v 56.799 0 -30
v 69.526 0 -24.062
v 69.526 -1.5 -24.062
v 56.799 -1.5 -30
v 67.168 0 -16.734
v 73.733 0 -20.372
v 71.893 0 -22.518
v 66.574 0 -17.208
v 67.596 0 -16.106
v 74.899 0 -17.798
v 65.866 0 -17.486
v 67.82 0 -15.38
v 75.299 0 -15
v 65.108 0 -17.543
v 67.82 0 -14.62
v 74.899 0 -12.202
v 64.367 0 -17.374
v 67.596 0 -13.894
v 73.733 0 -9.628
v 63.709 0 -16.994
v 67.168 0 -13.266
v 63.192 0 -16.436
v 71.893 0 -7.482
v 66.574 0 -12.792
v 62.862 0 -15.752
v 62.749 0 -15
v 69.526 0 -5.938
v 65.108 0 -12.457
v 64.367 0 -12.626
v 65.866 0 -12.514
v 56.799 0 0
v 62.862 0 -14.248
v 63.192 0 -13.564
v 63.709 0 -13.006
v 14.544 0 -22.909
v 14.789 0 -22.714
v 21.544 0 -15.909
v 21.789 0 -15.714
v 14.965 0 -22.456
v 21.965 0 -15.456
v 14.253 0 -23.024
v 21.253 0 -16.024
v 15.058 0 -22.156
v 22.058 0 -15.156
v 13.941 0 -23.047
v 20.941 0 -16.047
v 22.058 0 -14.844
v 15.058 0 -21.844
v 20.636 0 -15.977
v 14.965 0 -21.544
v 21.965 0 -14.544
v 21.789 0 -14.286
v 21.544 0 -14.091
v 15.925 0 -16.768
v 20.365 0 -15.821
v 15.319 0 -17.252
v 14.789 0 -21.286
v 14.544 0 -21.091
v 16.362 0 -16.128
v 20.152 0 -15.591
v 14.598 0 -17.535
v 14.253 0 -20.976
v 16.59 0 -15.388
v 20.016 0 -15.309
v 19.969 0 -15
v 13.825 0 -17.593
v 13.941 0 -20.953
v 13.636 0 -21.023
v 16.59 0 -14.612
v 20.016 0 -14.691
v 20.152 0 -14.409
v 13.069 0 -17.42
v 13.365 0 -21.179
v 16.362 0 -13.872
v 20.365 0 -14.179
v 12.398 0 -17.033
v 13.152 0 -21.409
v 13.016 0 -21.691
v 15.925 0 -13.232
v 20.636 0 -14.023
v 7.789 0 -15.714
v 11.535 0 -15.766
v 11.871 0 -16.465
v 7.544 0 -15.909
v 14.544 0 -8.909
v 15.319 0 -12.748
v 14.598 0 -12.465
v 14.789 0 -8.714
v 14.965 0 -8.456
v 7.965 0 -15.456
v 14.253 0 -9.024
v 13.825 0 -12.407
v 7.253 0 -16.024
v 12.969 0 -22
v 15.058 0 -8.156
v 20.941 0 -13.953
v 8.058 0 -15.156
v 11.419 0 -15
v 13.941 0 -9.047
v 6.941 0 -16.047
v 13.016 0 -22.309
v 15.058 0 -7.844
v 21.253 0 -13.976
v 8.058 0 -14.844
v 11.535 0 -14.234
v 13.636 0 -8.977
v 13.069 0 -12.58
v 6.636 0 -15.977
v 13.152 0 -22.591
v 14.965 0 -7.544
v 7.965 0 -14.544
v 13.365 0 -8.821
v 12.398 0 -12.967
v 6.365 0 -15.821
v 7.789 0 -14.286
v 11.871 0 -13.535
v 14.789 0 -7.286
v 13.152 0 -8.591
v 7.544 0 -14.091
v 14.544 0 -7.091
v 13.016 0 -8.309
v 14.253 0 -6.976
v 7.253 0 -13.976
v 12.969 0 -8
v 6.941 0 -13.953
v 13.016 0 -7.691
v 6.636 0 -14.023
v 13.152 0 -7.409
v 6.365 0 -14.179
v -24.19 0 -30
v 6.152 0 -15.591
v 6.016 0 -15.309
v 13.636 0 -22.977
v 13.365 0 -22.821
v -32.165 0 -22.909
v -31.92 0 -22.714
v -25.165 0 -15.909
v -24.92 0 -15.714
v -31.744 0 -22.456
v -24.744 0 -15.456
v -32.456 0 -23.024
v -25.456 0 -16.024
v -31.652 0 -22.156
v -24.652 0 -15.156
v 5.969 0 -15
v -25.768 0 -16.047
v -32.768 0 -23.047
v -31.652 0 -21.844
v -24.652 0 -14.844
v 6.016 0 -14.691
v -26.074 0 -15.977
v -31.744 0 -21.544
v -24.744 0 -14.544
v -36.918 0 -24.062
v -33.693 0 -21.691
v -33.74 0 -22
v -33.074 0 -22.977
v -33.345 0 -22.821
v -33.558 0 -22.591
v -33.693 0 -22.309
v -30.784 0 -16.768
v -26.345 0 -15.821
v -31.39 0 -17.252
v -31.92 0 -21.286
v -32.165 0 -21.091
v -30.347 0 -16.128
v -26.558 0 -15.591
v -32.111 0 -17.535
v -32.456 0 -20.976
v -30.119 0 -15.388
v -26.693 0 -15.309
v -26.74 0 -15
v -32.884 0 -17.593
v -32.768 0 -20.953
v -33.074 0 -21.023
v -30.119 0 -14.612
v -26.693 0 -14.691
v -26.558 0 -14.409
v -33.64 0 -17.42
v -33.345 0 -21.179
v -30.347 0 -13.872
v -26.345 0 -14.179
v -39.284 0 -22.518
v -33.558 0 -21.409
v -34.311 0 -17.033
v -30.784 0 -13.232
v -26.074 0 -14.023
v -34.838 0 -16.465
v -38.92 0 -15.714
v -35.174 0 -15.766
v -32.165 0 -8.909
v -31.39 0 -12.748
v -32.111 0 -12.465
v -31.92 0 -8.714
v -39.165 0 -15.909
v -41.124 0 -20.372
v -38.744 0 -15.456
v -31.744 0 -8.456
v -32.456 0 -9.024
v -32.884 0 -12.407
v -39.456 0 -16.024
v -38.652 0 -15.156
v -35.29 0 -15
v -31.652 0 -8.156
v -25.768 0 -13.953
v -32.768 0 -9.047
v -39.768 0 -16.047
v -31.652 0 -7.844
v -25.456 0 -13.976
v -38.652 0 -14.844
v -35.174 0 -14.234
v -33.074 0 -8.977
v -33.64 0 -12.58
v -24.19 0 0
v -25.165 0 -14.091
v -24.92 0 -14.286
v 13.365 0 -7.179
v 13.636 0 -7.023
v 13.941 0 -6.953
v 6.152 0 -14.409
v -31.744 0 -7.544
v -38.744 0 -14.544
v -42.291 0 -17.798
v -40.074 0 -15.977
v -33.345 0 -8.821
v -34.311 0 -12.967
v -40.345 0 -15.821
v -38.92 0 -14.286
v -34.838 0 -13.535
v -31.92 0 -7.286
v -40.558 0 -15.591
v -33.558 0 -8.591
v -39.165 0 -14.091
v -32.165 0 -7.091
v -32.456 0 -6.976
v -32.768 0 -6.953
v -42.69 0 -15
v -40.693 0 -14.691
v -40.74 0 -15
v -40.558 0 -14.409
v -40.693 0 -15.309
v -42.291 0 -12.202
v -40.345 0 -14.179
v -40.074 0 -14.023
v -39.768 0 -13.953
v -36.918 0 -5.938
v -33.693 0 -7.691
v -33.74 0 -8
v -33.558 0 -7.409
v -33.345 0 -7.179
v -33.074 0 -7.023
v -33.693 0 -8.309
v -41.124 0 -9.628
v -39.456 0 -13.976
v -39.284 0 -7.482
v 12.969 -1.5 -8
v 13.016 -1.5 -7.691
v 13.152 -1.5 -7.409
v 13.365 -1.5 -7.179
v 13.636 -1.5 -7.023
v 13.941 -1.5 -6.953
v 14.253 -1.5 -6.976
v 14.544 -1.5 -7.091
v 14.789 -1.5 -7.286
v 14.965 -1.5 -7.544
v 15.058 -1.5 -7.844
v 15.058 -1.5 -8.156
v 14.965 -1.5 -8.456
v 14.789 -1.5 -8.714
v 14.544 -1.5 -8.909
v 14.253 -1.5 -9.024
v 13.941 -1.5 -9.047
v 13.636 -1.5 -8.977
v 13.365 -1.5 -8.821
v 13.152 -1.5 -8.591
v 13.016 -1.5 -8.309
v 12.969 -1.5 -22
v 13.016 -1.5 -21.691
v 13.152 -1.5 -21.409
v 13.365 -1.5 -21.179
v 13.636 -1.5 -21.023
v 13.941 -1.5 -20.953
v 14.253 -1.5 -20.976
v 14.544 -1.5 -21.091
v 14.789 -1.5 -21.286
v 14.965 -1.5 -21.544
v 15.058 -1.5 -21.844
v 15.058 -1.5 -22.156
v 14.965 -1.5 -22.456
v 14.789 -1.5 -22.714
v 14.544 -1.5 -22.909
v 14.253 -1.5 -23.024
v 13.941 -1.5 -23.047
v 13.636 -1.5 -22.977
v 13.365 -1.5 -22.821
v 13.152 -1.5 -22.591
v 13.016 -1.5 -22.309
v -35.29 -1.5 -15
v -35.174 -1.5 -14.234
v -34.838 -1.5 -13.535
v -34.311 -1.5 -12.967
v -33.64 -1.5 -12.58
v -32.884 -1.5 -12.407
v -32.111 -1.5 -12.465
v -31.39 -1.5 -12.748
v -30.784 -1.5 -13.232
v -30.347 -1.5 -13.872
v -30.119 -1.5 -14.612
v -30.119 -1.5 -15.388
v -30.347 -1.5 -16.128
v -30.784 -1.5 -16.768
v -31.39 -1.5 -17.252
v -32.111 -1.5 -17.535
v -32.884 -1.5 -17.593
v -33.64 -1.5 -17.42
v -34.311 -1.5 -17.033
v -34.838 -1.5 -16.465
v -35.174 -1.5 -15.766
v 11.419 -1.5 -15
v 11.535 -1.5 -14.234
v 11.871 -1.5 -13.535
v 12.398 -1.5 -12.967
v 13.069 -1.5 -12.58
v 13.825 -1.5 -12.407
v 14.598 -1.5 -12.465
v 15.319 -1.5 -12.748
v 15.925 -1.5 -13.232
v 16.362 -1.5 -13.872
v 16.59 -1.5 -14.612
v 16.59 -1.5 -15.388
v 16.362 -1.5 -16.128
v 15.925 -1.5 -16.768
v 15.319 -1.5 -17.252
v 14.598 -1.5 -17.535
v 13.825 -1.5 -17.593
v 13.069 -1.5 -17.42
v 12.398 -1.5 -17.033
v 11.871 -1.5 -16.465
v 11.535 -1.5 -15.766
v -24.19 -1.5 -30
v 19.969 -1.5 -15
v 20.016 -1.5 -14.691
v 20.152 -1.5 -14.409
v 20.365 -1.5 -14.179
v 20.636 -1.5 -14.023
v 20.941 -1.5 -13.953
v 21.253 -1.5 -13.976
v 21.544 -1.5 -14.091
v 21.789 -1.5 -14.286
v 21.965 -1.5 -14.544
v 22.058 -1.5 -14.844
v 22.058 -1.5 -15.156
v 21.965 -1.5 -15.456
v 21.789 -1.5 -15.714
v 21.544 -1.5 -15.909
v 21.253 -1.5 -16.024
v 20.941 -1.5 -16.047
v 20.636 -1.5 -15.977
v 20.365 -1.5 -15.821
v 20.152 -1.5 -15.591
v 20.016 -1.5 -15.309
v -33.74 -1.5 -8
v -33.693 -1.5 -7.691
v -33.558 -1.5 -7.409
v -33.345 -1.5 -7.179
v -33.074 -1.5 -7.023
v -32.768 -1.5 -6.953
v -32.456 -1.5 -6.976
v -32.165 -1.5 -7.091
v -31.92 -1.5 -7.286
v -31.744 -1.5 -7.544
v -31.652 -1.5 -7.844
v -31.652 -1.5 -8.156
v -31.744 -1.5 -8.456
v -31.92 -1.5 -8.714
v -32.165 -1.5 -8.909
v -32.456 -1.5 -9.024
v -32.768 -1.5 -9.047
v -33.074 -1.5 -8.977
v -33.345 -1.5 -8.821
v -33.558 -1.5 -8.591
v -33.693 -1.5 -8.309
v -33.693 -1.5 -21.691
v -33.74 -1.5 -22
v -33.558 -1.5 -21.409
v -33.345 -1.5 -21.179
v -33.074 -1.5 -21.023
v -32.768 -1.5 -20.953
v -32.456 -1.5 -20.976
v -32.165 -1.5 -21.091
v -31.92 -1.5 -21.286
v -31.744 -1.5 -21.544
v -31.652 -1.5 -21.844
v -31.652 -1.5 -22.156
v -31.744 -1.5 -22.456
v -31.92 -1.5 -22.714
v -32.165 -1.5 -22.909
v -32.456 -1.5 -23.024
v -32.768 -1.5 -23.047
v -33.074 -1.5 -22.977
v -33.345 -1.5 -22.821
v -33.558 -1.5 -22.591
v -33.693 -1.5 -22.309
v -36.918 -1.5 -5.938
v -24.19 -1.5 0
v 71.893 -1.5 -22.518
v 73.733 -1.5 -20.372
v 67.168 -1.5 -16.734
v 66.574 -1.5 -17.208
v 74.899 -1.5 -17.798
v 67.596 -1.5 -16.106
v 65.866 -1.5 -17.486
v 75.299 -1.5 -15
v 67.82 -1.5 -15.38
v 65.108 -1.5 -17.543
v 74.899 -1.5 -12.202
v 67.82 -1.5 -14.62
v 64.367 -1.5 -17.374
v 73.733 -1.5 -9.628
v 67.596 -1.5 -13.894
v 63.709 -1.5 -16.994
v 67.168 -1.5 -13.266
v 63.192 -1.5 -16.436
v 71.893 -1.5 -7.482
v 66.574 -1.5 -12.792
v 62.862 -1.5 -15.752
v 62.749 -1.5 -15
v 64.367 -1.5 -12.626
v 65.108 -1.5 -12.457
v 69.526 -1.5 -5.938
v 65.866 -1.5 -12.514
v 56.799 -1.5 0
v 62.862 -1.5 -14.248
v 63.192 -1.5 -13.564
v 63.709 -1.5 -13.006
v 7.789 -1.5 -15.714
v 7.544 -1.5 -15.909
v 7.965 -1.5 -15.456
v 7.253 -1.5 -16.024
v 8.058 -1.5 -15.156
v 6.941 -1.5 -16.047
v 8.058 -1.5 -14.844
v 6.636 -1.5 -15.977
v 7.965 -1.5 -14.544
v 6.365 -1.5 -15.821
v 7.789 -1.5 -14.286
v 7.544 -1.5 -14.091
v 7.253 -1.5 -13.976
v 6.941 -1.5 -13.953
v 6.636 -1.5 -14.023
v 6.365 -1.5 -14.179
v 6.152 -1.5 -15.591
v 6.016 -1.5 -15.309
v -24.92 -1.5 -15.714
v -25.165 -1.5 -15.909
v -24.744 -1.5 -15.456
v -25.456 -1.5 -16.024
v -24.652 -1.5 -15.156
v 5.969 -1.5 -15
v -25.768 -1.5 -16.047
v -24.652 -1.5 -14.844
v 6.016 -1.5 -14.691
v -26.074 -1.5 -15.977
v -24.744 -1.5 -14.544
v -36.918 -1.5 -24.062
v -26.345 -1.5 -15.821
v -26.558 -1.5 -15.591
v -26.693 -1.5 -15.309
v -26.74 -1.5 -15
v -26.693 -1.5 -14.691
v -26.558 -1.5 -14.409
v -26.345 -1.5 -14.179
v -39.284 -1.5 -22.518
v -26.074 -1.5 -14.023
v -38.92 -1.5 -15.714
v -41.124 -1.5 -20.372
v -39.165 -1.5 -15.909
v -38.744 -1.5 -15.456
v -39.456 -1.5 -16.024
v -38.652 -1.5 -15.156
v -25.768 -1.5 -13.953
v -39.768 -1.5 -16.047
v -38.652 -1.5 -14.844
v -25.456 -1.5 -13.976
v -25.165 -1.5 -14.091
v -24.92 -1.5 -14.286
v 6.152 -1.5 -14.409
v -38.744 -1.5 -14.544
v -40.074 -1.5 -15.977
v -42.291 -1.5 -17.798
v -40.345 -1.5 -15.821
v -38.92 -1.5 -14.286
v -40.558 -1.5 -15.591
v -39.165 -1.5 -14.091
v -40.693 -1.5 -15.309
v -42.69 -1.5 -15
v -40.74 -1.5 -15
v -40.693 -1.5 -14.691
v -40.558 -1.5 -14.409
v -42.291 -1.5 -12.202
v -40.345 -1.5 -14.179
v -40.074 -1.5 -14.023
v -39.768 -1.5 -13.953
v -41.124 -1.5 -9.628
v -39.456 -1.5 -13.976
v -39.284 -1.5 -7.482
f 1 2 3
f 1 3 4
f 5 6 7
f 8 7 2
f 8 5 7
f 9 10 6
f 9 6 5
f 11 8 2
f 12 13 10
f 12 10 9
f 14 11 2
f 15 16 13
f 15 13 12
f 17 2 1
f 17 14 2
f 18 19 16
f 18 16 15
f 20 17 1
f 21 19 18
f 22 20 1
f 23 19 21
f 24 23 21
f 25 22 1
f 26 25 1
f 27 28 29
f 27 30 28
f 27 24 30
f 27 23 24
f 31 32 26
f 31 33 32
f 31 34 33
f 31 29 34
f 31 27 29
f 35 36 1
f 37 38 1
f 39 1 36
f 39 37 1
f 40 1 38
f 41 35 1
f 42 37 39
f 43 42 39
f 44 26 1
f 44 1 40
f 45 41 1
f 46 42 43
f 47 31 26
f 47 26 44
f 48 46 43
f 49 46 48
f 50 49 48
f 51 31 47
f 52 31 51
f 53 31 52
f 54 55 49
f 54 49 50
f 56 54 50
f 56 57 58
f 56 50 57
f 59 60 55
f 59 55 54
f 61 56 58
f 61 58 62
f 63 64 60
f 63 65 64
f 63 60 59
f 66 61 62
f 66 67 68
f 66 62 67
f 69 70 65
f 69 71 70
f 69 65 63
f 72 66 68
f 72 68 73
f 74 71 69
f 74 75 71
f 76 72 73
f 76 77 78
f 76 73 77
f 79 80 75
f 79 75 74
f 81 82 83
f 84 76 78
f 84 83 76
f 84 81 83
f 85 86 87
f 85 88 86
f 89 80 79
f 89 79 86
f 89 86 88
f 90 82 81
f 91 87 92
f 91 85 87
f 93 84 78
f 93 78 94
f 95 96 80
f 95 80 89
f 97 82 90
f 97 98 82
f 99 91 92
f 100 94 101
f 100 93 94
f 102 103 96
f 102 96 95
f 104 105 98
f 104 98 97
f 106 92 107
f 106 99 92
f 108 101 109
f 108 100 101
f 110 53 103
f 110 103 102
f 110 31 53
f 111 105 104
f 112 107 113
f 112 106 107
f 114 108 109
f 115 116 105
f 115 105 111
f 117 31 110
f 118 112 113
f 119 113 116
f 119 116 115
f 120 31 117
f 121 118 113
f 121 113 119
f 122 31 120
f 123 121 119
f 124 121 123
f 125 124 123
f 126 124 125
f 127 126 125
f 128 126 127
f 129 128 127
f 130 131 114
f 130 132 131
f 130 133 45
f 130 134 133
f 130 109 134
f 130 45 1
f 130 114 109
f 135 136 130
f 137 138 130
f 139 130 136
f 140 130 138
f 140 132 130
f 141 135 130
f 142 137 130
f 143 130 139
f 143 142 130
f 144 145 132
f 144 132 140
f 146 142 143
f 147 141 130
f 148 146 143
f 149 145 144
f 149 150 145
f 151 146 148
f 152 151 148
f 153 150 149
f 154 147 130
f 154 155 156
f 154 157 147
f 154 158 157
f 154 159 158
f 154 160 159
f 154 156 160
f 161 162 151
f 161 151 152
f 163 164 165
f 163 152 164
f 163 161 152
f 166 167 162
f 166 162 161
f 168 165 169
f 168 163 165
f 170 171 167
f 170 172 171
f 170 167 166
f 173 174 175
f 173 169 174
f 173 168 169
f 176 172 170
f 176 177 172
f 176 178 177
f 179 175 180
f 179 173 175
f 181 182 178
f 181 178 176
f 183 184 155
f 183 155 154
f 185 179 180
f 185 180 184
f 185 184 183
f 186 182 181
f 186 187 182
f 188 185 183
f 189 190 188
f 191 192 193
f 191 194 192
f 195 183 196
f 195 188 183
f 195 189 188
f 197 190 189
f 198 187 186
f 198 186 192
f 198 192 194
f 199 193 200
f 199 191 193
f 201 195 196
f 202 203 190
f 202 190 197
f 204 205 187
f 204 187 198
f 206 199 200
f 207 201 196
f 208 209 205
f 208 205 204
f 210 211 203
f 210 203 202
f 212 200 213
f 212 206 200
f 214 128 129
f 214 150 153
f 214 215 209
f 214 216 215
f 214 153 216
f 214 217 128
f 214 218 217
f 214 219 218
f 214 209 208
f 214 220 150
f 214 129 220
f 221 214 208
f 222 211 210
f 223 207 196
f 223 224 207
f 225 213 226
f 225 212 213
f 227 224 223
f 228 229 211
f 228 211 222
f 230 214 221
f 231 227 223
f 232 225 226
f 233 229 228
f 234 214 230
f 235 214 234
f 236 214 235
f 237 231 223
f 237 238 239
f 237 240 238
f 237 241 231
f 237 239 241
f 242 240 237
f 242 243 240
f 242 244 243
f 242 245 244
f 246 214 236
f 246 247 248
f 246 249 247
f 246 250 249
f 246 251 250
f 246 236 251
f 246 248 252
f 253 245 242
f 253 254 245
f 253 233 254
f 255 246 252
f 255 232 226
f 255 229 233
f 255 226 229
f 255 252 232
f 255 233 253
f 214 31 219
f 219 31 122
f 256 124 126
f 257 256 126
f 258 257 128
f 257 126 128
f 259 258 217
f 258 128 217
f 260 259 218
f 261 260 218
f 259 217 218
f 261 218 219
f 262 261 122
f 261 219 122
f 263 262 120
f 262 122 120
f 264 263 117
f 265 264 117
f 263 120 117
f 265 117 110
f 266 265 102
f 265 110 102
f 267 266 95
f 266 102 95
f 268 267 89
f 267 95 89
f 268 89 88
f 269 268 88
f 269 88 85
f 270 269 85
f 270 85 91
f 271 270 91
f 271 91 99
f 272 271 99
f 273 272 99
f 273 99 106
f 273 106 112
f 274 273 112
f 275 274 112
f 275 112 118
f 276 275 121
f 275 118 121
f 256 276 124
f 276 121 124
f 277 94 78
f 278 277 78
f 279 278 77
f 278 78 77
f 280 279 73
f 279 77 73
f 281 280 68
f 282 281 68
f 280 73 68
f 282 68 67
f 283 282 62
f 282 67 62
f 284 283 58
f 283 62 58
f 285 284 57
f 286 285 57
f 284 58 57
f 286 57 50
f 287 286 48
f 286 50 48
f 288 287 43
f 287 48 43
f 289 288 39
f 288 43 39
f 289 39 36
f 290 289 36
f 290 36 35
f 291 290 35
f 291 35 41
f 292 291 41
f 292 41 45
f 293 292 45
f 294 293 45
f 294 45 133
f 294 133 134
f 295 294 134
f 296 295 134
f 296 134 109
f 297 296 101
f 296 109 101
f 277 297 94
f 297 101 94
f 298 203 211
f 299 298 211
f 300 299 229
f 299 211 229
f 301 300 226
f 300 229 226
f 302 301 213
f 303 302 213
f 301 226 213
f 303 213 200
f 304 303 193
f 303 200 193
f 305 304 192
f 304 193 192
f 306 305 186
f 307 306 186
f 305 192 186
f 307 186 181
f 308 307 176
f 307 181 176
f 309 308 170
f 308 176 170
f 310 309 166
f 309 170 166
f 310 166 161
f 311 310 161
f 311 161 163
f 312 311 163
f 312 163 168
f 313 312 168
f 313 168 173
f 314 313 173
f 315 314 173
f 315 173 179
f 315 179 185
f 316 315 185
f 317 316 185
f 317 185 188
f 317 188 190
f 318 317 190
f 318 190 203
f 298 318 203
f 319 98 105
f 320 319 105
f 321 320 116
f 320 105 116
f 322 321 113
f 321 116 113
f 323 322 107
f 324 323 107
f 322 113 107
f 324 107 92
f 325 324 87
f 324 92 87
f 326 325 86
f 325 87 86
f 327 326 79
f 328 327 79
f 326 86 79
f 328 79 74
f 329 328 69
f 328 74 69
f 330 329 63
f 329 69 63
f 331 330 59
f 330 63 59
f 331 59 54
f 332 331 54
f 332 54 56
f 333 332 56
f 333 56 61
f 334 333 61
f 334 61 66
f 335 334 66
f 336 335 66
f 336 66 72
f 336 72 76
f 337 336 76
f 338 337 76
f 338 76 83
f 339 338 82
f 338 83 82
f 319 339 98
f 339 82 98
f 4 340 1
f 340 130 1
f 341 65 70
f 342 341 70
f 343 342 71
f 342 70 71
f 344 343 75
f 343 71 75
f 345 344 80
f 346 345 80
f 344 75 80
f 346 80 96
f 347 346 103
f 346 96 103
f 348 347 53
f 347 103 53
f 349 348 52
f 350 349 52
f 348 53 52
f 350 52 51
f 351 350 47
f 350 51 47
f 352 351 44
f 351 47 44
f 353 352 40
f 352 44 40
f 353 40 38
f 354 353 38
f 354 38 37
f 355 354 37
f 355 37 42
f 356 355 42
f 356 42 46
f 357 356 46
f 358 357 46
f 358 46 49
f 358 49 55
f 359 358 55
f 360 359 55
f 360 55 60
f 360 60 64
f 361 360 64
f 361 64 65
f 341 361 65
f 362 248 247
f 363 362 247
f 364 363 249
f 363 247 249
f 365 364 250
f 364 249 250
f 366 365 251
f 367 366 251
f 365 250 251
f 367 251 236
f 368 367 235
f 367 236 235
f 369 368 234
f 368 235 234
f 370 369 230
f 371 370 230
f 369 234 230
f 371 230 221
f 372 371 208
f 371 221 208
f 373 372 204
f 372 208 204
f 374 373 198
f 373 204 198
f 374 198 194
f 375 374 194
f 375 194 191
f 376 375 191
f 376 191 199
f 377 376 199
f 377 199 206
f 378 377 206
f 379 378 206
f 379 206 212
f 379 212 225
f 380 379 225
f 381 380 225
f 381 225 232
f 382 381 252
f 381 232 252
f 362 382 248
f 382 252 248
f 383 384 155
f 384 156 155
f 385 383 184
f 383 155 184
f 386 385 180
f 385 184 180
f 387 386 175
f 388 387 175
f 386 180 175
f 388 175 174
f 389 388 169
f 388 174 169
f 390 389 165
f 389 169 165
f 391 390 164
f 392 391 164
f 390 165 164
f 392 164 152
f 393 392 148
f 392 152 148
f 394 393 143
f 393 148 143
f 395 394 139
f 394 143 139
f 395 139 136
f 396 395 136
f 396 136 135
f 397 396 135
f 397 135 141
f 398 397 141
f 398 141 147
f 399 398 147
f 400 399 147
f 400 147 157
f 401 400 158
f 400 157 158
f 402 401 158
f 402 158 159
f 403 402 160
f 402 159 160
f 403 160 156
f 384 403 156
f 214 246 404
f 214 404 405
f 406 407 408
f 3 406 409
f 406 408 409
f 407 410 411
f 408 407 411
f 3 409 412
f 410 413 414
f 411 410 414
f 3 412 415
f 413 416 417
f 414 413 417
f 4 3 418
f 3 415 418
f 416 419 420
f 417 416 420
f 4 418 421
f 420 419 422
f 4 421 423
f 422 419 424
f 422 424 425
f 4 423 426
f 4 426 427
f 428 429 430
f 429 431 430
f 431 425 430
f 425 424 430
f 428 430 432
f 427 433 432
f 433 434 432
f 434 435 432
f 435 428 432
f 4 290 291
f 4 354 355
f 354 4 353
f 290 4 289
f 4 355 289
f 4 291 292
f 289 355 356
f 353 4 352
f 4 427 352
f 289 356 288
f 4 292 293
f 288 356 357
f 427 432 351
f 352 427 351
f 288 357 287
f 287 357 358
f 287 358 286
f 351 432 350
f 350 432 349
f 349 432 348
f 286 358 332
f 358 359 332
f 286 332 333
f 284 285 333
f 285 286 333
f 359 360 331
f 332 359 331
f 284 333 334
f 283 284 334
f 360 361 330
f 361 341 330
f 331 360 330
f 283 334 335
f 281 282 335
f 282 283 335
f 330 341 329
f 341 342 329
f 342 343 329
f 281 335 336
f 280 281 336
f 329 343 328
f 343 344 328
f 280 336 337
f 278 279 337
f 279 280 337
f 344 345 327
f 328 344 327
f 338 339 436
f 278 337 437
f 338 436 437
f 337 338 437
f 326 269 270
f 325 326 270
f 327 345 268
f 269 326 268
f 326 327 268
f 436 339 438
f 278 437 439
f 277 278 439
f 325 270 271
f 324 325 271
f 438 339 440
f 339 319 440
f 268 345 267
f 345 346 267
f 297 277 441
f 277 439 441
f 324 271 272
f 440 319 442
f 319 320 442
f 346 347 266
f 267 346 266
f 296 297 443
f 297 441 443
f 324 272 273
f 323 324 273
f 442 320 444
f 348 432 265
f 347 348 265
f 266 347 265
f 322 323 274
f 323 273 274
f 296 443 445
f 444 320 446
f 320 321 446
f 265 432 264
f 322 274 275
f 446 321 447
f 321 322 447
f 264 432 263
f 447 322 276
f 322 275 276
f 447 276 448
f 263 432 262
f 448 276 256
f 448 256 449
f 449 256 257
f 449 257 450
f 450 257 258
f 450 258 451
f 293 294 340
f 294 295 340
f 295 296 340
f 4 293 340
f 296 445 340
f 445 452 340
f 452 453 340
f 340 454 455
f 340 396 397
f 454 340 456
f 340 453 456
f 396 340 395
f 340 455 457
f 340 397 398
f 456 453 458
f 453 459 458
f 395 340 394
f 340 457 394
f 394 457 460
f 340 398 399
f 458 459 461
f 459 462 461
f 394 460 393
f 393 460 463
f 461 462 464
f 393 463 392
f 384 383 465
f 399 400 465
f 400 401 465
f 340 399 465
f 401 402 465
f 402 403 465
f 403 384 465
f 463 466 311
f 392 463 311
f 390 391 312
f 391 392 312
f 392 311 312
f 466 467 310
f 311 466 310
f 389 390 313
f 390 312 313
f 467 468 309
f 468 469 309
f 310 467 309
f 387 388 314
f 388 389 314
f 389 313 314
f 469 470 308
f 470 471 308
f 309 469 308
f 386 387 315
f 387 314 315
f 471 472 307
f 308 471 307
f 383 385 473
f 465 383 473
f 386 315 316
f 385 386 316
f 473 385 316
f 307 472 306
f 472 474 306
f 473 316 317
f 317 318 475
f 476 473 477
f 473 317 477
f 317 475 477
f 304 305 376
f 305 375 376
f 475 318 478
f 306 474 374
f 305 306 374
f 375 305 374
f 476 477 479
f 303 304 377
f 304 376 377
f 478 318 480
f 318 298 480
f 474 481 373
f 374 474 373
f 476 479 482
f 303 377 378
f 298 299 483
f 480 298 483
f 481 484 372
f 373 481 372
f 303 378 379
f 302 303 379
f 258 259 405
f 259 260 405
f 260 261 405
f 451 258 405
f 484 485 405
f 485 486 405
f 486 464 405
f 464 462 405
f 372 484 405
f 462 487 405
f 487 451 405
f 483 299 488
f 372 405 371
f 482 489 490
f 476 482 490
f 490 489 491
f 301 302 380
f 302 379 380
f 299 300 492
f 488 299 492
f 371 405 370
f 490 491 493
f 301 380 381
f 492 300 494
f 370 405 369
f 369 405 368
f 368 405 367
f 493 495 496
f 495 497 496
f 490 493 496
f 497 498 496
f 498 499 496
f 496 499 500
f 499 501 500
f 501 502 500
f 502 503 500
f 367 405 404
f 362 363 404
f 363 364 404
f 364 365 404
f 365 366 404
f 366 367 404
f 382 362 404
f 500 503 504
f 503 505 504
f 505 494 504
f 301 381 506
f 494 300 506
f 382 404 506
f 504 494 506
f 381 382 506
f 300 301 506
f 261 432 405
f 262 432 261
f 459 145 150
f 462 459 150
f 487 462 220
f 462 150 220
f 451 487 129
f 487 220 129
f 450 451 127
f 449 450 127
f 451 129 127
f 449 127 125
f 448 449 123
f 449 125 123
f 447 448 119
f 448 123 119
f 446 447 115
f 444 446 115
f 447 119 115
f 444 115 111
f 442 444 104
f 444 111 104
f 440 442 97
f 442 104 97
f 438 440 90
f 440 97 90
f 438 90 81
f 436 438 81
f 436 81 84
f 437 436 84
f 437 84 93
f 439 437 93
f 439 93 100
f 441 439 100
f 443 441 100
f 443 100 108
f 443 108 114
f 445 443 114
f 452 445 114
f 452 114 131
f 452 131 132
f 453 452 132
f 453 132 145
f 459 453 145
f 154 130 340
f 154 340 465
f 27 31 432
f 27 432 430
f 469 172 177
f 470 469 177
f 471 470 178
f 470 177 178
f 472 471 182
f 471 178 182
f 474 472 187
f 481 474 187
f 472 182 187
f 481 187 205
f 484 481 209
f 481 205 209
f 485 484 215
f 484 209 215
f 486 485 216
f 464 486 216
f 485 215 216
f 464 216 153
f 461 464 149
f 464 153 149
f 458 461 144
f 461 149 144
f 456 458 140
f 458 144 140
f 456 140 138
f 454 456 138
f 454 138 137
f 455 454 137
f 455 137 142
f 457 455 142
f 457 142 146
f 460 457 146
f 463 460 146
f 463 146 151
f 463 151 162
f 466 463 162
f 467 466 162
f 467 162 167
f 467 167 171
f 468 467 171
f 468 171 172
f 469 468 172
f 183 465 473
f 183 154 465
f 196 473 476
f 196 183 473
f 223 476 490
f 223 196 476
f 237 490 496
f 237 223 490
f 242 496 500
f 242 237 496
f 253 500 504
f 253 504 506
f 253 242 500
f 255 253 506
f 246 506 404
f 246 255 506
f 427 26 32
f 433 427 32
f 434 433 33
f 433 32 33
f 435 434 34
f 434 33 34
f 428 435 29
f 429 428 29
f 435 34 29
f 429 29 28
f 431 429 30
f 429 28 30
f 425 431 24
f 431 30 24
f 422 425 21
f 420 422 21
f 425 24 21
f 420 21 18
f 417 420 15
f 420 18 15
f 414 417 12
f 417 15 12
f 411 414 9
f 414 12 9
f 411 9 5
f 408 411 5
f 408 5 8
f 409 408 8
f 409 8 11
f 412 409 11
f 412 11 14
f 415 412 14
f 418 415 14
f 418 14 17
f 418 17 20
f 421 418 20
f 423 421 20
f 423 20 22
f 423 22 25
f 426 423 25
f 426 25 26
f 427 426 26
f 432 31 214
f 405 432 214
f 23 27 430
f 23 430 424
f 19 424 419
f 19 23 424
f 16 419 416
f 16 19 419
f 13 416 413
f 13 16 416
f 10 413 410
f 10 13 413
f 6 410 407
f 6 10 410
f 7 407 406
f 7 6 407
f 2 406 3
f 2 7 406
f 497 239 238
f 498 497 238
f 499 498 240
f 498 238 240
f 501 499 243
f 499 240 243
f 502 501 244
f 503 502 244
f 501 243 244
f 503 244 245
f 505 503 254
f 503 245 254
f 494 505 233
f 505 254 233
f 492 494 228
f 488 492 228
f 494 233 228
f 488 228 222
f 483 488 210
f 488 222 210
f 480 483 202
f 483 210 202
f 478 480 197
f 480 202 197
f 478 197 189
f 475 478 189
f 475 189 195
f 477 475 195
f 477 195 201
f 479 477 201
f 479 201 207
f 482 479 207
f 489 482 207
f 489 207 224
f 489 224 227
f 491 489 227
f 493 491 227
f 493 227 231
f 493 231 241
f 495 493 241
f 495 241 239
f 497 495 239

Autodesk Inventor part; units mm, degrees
ref_plane "YZ Plane" through (0, 0, 0) normal (1, 0, 0) x (0, 1, 0)
ref_plane "XZ Plane" through (0, 0, 0) normal (0, 1, 0) x (-1, 0, 0)
ref_plane "XY Plane" through (0, 0, 0) normal (0, 0, 1) x (1, 0, 0)
sketch "Sketch1" plane through (0, 0, 0) normal (0, 1, 0) x (-1, 0, 0)
  line L0 (-0.4496, -30) -> (-0.4496, 0)
  line L1 (-32.1589, 0) -> (-32.1589, -30)
  circle A0 centre (-65.2986, -15) radius 2.55
  circle A1 centre (32.69, -15) radius 2.6
  circle A2 centre (-7.0193, -15) radius 1.05
  circle A3 centre (-14.0193, -8) radius 1.05
  circle A4 centre (-14.0193, -22) radius 1.05
  circle A5 centre (-21.0193, -15) radius 1.05
  circle A6 centre (-14.0193, -15) radius 2.6
  circle A7 centre (25.69, -15) radius 1.05
  circle A8 centre (32.69, -8) radius 1.05
  circle A9 centre (32.69, -22) radius 1.05
  circle A10 centre (39.69, -15) radius 1.05
  line L2 (36.9177, -5.9376) -> (24.19, 0)
  line L3 (-56.7986, 0) -> (-69.5263, -5.9376)
  arc A11 (36.9177, -24.0624) -> (36.9177, -5.9376) centre (32.69, -15) ccw
  line L4 (24.19, -30) -> (36.9177, -24.0624)
  line L5 (-69.5263, -24.0624) -> (-56.7986, -30)
  arc A12 (-69.5263, -5.9376) -> (-69.5263, -24.0624) centre (-65.2986, -15) ccw
  line L6 (-56.7986, 0) -> (24.19, 0)
  line L7 (24.19, -30) -> (-56.7986, -30)
  line L8 (-32.6086, -30) -> (-32.6086, 0)
  line L9 (-31.7093, 0) -> (-31.7093, -30)
  line L10 (-0.8993, -30) -> (-0.8993, 0)
  line L11 (0, 0) -> (0, -30)
  point P0 (0, 0)
extrude "Extrusion1" add sketch "Sketch1" against normal blind 1.5
properties part number "CAM_axis_1_top_frame"
